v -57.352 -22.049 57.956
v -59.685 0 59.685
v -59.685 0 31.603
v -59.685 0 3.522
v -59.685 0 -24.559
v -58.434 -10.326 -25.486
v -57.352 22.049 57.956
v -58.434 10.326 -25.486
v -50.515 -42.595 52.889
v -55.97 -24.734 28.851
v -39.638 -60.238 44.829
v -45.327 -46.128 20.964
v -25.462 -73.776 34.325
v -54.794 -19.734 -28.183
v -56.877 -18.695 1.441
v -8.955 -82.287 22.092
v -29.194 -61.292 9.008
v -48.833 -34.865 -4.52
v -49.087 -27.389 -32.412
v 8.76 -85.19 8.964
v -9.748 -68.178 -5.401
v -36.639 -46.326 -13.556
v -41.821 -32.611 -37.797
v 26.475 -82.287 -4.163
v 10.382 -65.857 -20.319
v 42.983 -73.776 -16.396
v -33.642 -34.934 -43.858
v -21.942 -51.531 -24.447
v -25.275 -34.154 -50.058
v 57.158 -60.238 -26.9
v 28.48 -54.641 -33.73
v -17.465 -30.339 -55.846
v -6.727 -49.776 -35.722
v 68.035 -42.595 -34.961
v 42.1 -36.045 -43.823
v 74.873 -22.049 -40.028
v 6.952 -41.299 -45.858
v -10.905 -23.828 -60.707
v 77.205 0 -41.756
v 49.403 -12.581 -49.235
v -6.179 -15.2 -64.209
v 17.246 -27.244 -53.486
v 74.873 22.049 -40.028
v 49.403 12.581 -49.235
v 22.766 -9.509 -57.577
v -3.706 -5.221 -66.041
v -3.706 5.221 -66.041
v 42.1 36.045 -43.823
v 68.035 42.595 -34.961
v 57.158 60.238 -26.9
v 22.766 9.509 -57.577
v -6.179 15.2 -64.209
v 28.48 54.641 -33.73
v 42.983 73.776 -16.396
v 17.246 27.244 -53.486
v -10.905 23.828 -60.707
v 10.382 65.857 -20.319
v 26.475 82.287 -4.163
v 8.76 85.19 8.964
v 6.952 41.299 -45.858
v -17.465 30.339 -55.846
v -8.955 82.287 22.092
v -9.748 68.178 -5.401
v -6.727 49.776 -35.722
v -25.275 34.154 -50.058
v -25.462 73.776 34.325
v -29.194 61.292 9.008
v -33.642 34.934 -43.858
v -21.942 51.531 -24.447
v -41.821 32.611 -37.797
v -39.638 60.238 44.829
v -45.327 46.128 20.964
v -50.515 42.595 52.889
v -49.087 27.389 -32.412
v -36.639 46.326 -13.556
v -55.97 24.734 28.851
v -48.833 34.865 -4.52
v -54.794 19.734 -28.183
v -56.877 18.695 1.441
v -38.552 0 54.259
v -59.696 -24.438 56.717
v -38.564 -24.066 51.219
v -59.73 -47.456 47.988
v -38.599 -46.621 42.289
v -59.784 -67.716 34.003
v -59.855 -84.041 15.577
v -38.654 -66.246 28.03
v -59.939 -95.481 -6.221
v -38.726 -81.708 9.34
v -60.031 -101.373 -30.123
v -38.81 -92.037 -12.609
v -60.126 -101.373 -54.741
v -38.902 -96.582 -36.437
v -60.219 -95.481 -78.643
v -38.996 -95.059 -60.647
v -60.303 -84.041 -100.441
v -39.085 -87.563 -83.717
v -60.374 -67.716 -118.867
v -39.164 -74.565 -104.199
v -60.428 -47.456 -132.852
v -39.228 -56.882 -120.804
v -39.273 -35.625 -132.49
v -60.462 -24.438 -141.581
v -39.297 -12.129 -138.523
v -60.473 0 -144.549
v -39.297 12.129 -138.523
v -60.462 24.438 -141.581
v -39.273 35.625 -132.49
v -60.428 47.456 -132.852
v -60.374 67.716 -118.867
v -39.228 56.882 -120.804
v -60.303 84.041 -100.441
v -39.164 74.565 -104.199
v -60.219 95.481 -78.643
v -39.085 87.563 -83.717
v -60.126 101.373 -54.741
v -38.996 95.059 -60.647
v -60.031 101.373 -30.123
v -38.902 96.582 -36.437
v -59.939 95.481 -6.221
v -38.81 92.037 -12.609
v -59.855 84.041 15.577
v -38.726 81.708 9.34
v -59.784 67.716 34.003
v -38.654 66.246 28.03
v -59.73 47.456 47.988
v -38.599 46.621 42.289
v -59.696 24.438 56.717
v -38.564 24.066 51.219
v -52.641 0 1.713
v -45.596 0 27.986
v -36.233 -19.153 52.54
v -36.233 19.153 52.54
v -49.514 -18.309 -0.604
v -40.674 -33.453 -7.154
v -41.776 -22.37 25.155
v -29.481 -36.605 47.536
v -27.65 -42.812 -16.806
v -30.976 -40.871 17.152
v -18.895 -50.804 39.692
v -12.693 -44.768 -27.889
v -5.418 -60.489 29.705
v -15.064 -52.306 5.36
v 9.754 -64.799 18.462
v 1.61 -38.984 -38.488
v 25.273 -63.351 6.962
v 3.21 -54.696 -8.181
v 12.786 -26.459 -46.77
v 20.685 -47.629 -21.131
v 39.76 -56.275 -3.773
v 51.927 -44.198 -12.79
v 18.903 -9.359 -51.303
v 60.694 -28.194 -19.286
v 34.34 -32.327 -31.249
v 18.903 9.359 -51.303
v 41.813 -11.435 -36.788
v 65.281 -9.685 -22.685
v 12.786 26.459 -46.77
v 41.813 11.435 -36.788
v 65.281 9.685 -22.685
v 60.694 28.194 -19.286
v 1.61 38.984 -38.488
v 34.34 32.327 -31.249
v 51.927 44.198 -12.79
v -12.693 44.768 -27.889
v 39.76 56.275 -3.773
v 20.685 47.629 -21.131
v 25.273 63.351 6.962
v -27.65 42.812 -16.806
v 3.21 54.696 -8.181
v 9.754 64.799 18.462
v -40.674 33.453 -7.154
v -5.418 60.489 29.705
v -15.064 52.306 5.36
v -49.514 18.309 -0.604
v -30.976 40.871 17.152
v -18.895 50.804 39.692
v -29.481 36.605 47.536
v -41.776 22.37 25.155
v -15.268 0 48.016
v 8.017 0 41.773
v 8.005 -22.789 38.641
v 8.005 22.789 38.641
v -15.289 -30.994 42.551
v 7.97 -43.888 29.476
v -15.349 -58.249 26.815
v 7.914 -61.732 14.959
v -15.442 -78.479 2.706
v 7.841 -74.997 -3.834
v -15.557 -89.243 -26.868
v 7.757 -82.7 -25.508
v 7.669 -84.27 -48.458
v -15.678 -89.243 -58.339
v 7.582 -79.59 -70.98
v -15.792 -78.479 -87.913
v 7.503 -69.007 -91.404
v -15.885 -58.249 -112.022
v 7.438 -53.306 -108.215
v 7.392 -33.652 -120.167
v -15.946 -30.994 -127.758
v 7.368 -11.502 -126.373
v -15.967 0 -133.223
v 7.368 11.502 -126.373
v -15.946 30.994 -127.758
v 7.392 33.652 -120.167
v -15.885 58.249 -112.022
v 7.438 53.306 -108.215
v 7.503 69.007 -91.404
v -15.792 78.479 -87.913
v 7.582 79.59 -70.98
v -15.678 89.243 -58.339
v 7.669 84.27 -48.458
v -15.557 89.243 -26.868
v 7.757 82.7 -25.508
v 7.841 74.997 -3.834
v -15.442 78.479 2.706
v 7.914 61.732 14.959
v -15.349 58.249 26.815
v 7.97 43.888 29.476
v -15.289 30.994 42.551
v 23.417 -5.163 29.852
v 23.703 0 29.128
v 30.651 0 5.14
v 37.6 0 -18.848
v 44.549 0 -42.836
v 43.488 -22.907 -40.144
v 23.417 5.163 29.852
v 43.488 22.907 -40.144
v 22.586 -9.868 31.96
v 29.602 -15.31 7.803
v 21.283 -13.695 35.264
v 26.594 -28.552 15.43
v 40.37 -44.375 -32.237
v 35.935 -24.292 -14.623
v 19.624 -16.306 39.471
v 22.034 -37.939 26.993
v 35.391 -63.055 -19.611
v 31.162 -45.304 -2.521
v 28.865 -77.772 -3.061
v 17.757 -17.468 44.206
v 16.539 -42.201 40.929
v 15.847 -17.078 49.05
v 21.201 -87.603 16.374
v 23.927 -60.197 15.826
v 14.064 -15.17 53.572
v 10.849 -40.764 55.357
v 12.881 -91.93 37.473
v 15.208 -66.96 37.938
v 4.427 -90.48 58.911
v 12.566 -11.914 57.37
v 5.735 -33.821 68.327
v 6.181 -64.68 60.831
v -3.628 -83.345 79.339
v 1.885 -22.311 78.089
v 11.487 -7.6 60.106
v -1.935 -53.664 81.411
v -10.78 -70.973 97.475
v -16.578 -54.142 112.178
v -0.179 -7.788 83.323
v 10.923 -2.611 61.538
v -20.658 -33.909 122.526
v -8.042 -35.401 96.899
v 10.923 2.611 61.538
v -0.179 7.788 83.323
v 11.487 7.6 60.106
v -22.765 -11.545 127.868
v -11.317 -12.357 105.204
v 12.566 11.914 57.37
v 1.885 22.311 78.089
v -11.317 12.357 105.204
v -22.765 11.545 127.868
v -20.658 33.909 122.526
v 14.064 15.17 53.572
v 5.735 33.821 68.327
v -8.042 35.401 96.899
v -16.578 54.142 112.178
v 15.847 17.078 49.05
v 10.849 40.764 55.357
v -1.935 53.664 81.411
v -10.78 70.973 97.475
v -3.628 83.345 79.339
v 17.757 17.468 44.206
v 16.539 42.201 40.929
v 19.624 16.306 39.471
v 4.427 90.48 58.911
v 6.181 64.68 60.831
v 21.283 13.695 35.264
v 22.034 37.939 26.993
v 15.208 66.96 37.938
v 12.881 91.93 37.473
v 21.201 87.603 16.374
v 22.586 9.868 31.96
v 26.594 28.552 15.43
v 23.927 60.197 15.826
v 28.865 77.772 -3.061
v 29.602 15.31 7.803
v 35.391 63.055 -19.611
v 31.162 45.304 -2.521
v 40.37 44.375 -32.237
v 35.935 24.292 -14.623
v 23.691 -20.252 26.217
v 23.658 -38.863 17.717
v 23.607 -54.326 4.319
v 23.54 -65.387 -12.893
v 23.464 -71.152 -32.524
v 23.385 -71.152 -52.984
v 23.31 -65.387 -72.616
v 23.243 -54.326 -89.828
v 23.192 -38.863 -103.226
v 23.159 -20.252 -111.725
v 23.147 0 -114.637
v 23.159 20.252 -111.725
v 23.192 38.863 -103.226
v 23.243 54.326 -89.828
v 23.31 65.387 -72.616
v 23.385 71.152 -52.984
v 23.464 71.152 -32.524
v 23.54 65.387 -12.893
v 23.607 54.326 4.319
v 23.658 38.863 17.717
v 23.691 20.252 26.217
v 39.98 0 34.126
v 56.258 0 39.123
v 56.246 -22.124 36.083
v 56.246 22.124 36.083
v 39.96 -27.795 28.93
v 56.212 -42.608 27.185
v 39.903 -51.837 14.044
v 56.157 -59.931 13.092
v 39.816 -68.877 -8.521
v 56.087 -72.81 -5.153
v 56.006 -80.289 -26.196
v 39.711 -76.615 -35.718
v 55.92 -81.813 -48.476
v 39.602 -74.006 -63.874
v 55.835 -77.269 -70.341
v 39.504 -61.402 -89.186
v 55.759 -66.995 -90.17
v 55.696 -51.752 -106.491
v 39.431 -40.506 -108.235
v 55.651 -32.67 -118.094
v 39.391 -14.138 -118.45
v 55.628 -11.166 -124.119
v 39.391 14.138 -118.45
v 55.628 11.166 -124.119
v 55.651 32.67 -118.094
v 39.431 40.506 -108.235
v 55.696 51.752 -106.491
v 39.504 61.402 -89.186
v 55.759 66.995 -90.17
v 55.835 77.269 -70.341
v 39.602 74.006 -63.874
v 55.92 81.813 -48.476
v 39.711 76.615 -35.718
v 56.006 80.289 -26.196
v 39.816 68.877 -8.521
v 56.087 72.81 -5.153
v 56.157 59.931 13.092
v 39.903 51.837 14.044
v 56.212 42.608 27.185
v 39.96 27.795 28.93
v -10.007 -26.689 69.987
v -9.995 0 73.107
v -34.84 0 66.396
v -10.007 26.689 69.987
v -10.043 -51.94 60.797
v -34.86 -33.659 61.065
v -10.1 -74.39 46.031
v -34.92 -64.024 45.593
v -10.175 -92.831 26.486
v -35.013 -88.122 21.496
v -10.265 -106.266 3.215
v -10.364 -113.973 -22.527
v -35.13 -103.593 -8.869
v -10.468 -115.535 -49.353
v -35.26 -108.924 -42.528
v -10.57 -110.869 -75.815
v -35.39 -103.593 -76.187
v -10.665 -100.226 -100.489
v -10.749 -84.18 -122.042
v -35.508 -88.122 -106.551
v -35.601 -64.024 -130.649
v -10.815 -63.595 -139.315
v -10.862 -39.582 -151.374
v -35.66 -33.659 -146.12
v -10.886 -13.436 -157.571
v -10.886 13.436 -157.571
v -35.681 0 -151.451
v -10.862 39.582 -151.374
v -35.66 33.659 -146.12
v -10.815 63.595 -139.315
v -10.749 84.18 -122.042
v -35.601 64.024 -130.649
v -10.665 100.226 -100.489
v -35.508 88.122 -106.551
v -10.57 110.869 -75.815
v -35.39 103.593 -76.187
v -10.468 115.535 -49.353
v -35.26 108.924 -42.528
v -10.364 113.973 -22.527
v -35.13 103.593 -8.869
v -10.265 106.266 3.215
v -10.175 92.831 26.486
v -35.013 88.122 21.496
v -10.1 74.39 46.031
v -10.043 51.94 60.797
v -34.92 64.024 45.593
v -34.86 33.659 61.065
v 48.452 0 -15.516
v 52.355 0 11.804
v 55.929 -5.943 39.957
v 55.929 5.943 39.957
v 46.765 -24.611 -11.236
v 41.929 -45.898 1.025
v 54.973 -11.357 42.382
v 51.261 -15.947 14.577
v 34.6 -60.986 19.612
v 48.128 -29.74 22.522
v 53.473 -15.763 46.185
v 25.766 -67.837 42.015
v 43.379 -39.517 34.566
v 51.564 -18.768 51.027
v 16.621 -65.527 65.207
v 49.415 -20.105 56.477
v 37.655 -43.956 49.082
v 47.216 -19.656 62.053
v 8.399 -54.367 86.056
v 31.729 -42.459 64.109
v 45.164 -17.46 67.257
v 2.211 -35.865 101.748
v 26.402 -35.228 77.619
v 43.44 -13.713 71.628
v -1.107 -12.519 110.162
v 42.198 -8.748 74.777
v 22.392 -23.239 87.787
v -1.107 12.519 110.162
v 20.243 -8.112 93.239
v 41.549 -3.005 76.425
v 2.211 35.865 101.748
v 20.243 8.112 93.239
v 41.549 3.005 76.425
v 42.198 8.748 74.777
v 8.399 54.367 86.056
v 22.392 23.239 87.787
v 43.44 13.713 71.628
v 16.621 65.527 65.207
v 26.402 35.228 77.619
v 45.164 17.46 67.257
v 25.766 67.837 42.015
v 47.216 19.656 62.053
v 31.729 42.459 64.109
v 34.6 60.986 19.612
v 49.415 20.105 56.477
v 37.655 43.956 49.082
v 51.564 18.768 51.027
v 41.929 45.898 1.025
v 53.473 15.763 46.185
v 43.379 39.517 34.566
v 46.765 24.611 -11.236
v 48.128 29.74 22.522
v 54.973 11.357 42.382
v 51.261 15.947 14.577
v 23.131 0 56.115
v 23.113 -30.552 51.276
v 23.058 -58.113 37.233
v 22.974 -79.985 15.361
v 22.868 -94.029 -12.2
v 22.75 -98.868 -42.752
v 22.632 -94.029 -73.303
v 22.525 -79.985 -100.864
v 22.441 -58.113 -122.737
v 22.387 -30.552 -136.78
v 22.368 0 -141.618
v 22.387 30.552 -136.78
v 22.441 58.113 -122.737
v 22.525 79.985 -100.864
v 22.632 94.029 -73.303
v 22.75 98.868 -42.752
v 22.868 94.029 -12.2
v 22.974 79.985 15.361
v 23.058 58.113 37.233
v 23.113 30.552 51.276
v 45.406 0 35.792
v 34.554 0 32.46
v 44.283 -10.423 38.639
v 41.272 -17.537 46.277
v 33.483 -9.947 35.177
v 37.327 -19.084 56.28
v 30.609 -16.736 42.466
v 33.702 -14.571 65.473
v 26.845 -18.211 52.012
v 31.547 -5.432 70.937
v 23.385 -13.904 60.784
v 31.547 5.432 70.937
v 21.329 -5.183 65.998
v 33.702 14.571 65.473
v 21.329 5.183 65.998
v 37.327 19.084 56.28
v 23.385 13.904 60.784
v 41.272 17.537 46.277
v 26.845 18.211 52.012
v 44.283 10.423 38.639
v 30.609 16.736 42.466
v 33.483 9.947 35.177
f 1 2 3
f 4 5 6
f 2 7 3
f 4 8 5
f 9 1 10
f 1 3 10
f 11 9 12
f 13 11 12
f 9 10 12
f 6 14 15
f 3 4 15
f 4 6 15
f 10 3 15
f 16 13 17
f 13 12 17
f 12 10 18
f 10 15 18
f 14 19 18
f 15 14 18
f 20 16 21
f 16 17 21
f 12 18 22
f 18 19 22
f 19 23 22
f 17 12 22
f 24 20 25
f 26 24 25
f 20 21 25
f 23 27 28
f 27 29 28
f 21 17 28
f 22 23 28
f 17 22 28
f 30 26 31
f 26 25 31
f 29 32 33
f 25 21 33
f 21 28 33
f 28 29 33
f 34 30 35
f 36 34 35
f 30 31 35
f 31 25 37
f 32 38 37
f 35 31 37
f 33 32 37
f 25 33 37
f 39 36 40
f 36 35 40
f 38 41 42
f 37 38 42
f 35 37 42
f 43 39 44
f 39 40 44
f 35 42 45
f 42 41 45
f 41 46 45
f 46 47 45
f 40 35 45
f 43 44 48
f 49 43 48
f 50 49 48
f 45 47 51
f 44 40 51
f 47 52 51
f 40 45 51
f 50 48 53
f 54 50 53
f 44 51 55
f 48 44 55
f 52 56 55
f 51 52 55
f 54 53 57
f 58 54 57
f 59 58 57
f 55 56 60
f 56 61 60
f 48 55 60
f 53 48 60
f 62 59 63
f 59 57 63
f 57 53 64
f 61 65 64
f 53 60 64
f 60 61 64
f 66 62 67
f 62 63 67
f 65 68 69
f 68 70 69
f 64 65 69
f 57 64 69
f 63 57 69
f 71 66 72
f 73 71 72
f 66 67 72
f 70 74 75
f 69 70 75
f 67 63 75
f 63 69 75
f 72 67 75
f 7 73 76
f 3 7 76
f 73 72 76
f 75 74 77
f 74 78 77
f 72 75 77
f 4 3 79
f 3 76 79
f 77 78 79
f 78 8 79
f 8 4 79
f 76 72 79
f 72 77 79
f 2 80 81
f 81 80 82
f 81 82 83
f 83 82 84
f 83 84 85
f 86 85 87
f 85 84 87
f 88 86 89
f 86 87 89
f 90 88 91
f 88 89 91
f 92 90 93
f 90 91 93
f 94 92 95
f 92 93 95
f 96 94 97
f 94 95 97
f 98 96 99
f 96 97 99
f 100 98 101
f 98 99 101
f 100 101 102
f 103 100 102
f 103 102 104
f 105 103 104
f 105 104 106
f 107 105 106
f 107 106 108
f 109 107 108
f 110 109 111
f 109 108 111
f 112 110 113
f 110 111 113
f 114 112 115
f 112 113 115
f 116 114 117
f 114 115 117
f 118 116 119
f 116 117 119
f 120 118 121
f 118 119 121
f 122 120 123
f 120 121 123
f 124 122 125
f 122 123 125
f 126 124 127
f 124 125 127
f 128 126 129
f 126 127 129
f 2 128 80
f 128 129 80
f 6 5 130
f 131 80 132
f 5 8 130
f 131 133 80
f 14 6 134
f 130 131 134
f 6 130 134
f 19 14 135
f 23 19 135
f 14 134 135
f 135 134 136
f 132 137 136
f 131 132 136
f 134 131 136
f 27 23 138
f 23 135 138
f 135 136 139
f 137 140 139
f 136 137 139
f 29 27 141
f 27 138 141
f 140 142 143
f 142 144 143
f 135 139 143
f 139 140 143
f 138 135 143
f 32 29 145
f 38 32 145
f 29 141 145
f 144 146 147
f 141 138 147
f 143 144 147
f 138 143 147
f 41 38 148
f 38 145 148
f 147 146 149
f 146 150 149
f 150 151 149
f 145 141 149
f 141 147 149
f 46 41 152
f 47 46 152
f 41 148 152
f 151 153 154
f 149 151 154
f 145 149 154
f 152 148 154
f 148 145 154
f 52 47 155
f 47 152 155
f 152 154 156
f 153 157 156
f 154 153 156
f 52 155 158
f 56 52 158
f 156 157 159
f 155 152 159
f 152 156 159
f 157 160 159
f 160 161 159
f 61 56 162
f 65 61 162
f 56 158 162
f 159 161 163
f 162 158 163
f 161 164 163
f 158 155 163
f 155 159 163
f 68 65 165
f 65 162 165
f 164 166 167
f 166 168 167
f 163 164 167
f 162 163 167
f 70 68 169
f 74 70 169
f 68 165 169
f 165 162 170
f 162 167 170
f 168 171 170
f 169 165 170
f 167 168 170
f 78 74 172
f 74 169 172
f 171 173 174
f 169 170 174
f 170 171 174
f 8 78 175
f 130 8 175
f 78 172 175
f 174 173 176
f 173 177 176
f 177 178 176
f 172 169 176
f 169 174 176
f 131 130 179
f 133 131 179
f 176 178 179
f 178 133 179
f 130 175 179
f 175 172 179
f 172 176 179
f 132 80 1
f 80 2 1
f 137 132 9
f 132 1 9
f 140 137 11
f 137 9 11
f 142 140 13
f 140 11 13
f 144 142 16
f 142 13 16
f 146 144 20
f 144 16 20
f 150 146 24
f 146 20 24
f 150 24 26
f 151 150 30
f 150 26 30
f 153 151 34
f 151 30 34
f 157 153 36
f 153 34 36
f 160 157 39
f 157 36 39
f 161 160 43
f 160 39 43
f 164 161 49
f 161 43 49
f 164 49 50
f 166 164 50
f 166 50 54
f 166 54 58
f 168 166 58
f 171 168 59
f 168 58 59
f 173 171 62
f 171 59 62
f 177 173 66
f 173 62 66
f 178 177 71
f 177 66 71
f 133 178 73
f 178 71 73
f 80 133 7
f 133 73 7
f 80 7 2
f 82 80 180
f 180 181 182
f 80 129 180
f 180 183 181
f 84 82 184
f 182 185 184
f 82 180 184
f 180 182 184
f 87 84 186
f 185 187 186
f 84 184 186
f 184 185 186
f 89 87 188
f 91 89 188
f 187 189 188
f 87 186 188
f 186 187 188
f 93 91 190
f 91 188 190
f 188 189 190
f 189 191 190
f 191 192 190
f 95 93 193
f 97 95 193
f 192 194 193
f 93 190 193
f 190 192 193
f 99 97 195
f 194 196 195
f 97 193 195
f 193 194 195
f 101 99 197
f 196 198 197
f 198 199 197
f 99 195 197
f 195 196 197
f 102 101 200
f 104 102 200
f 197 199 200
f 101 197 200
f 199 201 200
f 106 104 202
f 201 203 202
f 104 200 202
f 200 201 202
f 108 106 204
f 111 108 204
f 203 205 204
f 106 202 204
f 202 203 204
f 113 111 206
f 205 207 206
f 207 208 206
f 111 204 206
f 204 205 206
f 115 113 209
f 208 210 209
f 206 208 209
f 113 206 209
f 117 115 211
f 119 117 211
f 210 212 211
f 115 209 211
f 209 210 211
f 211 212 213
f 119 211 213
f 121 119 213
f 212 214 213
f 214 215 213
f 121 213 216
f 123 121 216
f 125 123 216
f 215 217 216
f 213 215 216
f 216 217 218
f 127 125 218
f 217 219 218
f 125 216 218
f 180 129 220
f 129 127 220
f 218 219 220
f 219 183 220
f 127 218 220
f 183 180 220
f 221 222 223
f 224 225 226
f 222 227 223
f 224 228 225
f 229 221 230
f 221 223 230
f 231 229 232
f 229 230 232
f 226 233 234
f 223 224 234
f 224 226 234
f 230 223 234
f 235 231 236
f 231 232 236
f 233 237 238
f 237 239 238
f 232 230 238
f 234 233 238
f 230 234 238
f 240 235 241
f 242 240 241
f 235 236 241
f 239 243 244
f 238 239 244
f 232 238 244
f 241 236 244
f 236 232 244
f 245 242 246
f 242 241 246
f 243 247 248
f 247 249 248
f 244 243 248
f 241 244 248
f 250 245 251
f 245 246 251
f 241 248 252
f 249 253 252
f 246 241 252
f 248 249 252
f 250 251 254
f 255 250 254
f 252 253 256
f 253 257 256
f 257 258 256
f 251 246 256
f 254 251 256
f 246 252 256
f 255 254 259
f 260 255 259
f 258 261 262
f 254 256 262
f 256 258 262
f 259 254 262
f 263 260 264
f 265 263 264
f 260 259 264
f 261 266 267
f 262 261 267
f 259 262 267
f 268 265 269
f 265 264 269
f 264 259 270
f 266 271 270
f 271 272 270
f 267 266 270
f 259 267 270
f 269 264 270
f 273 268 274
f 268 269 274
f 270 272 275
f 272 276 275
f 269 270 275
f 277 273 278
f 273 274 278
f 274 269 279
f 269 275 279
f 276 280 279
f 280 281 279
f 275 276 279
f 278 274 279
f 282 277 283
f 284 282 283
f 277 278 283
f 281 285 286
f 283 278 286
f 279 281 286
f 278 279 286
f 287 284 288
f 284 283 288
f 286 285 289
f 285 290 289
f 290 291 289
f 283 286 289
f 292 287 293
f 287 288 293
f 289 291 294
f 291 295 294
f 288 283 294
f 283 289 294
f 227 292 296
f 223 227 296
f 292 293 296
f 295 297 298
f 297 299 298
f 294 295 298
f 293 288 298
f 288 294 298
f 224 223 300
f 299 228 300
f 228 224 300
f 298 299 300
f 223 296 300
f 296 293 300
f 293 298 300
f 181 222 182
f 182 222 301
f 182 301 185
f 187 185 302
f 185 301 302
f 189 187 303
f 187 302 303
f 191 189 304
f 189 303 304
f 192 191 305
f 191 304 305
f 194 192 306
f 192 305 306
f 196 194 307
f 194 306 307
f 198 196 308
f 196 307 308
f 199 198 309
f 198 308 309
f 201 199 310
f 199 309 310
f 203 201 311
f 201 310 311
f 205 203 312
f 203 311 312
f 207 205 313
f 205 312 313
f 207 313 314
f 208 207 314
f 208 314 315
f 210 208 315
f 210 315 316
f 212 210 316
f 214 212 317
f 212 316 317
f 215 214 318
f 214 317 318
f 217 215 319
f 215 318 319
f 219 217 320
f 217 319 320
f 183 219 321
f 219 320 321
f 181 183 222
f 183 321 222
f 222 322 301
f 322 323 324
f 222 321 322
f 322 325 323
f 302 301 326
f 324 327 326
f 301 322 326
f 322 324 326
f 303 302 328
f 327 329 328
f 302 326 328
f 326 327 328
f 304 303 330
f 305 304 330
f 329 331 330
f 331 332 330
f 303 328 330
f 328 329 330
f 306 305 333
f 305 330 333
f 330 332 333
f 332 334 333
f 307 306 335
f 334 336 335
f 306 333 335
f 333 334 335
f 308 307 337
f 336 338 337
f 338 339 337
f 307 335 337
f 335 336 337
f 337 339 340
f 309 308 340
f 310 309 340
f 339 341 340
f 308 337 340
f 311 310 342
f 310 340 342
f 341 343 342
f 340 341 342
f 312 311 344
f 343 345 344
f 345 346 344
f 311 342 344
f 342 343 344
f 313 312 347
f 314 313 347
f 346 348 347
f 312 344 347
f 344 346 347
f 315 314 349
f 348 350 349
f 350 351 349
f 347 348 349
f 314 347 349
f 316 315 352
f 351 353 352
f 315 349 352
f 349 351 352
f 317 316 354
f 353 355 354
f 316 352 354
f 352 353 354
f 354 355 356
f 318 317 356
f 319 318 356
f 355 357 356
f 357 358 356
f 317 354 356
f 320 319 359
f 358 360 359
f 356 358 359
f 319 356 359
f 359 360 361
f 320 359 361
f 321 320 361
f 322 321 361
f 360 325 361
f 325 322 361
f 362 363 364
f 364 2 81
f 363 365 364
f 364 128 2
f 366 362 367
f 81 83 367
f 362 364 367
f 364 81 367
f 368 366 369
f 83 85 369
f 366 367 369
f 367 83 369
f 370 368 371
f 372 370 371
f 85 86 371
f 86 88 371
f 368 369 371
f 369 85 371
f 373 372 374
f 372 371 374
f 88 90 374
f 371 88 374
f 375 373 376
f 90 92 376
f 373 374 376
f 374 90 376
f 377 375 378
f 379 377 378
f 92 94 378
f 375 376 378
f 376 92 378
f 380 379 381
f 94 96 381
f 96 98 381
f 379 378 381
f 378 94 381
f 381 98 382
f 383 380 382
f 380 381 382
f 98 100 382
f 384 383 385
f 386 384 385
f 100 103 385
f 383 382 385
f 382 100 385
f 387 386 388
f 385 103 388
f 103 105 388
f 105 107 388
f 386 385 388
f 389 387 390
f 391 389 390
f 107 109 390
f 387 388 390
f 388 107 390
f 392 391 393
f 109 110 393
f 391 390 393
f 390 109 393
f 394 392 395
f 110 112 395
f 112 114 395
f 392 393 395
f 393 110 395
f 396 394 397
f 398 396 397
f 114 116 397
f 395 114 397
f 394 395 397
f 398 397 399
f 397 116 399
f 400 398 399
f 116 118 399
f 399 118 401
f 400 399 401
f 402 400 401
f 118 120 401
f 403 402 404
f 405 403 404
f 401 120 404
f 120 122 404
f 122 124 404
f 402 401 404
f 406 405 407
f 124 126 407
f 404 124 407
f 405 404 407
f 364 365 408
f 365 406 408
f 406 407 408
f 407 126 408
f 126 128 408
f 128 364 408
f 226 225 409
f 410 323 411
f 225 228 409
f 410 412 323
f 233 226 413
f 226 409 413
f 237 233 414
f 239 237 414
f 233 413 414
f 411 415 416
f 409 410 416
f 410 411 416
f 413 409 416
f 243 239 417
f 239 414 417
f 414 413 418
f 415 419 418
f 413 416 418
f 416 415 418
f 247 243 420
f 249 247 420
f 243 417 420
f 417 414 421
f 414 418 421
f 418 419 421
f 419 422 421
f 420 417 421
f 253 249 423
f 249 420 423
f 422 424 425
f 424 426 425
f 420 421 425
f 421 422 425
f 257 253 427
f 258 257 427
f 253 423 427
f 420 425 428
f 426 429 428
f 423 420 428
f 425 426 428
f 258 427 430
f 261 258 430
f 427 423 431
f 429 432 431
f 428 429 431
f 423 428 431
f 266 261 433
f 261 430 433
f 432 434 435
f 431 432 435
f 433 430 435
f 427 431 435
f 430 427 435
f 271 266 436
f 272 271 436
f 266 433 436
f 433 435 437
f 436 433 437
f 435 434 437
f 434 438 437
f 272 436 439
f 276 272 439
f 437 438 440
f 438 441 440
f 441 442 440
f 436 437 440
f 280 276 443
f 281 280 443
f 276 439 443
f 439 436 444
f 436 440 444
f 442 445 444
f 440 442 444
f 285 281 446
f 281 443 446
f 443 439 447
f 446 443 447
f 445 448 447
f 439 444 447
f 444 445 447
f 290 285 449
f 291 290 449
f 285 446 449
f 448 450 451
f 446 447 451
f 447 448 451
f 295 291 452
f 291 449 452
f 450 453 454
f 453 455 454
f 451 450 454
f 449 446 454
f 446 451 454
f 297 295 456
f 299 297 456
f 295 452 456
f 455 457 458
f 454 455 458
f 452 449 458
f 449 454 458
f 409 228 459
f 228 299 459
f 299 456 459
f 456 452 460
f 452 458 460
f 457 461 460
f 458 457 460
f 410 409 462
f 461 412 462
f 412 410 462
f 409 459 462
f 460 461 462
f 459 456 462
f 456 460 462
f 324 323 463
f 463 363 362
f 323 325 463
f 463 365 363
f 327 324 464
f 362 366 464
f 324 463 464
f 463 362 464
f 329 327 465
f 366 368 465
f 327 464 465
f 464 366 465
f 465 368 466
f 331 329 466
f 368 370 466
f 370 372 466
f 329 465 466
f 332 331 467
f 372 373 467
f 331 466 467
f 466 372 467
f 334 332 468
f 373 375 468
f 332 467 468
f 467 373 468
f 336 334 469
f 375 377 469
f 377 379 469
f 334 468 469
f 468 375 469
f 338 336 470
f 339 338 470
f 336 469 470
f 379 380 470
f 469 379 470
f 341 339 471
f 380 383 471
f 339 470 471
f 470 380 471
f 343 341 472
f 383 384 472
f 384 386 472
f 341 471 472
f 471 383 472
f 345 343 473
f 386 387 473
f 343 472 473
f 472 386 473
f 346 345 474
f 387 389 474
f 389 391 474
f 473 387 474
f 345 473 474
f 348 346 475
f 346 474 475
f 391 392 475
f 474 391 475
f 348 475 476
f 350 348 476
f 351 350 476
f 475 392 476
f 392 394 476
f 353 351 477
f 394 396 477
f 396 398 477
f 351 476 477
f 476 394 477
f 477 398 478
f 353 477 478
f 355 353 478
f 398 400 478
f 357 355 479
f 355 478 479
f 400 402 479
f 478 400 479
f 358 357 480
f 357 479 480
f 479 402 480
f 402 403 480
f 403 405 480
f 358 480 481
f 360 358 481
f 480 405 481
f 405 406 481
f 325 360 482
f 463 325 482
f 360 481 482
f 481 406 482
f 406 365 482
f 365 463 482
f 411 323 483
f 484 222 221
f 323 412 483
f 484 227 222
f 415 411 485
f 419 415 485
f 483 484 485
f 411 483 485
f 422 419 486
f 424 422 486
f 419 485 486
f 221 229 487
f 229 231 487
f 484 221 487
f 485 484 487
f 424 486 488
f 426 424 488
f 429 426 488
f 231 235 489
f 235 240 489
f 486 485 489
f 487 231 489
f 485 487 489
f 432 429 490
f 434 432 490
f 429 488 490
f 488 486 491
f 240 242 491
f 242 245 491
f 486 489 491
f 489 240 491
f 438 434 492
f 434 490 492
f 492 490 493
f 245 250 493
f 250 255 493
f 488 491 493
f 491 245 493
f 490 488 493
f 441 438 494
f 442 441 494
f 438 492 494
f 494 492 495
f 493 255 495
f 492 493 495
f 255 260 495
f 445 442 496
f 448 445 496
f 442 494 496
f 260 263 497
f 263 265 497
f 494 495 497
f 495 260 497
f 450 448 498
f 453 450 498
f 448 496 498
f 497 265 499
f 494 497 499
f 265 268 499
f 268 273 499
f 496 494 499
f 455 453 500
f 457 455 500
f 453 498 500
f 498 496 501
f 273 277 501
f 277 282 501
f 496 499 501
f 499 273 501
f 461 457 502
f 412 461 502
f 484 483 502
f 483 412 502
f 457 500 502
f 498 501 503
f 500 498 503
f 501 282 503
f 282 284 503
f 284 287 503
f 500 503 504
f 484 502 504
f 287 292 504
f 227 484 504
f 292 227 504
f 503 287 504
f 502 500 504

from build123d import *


with BuildPart() as f1:
    # F0 (on Front) → F1 (revolve)
    with BuildSketch(Plane.XZ):
        Polygon((-38.552307, 54.258808), (8.017262, 41.772763), (23.702534, 29.128414), (56.257818, 39.123457), (-9.99504, 73.106609), (-59.684686, 59.68469), align=None)
    revolve(axis=Axis((7.56768, 0, -42.693114), (0.999993, 0, -0.003861)))


with BuildPart() as f2:
    # F0 (on Front) → F2 (revolve)
    with BuildSketch(Plane.XZ):
        Polygon((56.257818, 39.123457), (23.702534, 29.128414), (44.549342, -42.835899), align=None)
    revolve(axis=Axis((-15.981456, 0, 32.309291), (-0.930284, 0, -0.366841)))


with BuildPart() as f3:
    # F0 (on Front) → F3 (revolve)
    with BuildSketch(Plane.XZ):
        Polygon((-59.684686, 59.68469), (-59.684686, -24.559248), (-38.552307, 54.258808), align=None)
    revolve(axis=Axis((-2.855725, 0, -6.710958), (0.595381, 0, 0.803444)))


solid = Compound([f1.part, f2.part, f3.part])
